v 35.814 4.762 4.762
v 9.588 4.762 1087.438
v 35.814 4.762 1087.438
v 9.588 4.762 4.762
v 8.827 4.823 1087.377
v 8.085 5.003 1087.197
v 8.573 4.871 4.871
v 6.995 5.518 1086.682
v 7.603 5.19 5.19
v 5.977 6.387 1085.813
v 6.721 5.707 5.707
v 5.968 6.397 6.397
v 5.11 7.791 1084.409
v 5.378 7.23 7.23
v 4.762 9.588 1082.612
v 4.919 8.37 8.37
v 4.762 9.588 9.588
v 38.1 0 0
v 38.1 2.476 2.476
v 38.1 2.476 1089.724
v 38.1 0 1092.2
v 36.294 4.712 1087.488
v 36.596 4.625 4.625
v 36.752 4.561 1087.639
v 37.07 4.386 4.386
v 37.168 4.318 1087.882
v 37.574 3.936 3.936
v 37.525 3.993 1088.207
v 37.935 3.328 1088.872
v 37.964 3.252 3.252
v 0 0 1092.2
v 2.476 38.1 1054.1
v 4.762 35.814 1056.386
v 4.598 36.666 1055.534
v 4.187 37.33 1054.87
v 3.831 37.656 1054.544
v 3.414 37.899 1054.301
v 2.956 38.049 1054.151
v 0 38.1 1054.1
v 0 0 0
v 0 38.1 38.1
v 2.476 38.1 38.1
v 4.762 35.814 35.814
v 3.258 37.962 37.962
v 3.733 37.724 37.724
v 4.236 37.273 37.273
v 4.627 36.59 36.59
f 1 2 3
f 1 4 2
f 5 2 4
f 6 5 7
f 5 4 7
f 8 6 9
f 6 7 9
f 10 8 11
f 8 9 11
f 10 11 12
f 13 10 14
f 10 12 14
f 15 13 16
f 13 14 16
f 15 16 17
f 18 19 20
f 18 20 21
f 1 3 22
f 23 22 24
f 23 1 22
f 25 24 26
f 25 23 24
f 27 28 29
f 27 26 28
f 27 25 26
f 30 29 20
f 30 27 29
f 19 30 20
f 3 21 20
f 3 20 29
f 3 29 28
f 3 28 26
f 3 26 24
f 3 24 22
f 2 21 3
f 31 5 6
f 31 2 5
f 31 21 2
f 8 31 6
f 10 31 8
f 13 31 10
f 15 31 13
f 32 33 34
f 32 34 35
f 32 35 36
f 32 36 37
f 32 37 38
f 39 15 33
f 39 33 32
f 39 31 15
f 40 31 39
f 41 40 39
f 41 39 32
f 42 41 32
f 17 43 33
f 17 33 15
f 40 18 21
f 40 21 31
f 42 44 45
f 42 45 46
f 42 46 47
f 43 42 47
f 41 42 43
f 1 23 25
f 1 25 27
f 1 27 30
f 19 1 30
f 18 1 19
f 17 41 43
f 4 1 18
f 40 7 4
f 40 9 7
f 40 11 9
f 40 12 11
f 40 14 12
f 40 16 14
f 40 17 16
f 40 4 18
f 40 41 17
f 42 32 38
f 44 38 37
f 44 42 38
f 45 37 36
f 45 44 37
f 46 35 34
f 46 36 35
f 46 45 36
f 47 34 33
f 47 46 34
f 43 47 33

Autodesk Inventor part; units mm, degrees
ref_plane "Start plane" through (0, 0, 0) normal (0, 0, 1) x (1, 0, 0)
ref_plane "End plane" through (0, 0, 1092.2) normal (0, 0, 1) x (1, 0, 0)
sketch "Sketch" plane through (0, 0, 0) normal (0, 0, 1) x (1, 0, 0)
  line L0 (38.1, 0) -> (0, 0)
  line L1 (0, 0) -> (0, 38.1)
  line L2 (0, 38.1) -> (2.4765, 38.1)
  line L3 (4.7625, 35.814) -> (4.7625, 9.5885)
  line L4 (9.5885, 4.7625) -> (35.814, 4.7625)
  line L5 (38.1, 2.4765) -> (38.1, 0)
  line L6 (0, -11.0414) -> (0, 31.5385) construction
  line L7 (-11.0414, 0) -> (31.5385, 0) construction
  arc A0 (4.7625, 9.5885) -> (9.5885, 4.7625) centre (9.5885, 9.5885) ccw
  arc A1 (4.7625, 35.814) -> (2.4765, 38.1) centre (2.4765, 35.814) ccw
  arc A2 (38.1, 2.4765) -> (35.814, 4.7625) centre (35.814, 2.4765) ccw
  line L8 (0, 48.4964) -> (0, -20.9644) construction
  line L9 (-20.9644, 0) -> (48.4964, 0) construction
  point P0 (4.7625, 38.1)
  point P1 (4.7625, 4.7625)
  point P2 (38.1, 4.7625)
  dimension "d0" = 38.1
  dimension "d1" = 38.1
  dimension "d2" = 4.7625
  dimension "d3" = 4.7625
  dimension "d10" = 0
  dimension "d11" = 0
  dimension "d14" = 4.826
  dimension "d15" = 2.286
extrude "Body" add sketch "Sketch" along normal up to surface (1092.2 mm away) from surface at 0
sketch "Sketch3" plane through (0, 0, 0) normal (0, 0, 1) x (1, 0, 0)
  line L0 (0, 0) -> (10, 0)
ref_plane "Work Plane3" through (0, 0, 0) normal (0, -1, 0) x (1, 0, 0)
sketch "Sketch4" plane through (0, 0, 0) normal (0, -1, 0) x (1, 0, 0)
  line L0 (-2, 0) -> (12, 0)
  line L1 (-2, 1092.2) -> (12, 1092.2)
  dimension "d17" = 1092.2
ref_plane "Work Plane4" through (19.05, 0, 0) normal (0, 0.7071, -0.7071) x (1, 0, 0)
split "Split1" plane through (19.05, 0, 0) removes the side toward (0, 0.7071, -0.7071)
ref_plane "Work Plane5" through (19.05, 0, 1092.2) normal (0, 0.7071, 0.7071) x (1, 0, 0)
split "Split2" plane through (19.05, 0, 1092.2) removes the side toward (0, 0.7071, 0.7071)
equation "\"d0\" = G_H"
equation "\"d1\" = G_H"
equation "\"d2\" = G_T"
equation "\"d3\" = G_T"
equation "\"d14\" = G_IR"
equation "\"d15\" = G_ER"
equation "\"d4\" = G_L"
equation "\"G_H\" = 38.1"
equation "\"G_T\" = 4.7625"
equation "\"G_ER\" = 2.286"
equation "\"G_IR\" = 4.826"
equation "\"G_L\" = d17"
equation "\"ex\" = 0"
equation "\"G_OFFSET_START\" = 0"
equation "\"G_OFFSET_END\" = 0"
equation "\"d13\" = G_OFFSET_END + B_L"
equation "\"B_L\" = 1092.2"
properties part number "AISC - L 1.5 x 1.5 x 3/16 - 43" material "Aluminum 6061"
